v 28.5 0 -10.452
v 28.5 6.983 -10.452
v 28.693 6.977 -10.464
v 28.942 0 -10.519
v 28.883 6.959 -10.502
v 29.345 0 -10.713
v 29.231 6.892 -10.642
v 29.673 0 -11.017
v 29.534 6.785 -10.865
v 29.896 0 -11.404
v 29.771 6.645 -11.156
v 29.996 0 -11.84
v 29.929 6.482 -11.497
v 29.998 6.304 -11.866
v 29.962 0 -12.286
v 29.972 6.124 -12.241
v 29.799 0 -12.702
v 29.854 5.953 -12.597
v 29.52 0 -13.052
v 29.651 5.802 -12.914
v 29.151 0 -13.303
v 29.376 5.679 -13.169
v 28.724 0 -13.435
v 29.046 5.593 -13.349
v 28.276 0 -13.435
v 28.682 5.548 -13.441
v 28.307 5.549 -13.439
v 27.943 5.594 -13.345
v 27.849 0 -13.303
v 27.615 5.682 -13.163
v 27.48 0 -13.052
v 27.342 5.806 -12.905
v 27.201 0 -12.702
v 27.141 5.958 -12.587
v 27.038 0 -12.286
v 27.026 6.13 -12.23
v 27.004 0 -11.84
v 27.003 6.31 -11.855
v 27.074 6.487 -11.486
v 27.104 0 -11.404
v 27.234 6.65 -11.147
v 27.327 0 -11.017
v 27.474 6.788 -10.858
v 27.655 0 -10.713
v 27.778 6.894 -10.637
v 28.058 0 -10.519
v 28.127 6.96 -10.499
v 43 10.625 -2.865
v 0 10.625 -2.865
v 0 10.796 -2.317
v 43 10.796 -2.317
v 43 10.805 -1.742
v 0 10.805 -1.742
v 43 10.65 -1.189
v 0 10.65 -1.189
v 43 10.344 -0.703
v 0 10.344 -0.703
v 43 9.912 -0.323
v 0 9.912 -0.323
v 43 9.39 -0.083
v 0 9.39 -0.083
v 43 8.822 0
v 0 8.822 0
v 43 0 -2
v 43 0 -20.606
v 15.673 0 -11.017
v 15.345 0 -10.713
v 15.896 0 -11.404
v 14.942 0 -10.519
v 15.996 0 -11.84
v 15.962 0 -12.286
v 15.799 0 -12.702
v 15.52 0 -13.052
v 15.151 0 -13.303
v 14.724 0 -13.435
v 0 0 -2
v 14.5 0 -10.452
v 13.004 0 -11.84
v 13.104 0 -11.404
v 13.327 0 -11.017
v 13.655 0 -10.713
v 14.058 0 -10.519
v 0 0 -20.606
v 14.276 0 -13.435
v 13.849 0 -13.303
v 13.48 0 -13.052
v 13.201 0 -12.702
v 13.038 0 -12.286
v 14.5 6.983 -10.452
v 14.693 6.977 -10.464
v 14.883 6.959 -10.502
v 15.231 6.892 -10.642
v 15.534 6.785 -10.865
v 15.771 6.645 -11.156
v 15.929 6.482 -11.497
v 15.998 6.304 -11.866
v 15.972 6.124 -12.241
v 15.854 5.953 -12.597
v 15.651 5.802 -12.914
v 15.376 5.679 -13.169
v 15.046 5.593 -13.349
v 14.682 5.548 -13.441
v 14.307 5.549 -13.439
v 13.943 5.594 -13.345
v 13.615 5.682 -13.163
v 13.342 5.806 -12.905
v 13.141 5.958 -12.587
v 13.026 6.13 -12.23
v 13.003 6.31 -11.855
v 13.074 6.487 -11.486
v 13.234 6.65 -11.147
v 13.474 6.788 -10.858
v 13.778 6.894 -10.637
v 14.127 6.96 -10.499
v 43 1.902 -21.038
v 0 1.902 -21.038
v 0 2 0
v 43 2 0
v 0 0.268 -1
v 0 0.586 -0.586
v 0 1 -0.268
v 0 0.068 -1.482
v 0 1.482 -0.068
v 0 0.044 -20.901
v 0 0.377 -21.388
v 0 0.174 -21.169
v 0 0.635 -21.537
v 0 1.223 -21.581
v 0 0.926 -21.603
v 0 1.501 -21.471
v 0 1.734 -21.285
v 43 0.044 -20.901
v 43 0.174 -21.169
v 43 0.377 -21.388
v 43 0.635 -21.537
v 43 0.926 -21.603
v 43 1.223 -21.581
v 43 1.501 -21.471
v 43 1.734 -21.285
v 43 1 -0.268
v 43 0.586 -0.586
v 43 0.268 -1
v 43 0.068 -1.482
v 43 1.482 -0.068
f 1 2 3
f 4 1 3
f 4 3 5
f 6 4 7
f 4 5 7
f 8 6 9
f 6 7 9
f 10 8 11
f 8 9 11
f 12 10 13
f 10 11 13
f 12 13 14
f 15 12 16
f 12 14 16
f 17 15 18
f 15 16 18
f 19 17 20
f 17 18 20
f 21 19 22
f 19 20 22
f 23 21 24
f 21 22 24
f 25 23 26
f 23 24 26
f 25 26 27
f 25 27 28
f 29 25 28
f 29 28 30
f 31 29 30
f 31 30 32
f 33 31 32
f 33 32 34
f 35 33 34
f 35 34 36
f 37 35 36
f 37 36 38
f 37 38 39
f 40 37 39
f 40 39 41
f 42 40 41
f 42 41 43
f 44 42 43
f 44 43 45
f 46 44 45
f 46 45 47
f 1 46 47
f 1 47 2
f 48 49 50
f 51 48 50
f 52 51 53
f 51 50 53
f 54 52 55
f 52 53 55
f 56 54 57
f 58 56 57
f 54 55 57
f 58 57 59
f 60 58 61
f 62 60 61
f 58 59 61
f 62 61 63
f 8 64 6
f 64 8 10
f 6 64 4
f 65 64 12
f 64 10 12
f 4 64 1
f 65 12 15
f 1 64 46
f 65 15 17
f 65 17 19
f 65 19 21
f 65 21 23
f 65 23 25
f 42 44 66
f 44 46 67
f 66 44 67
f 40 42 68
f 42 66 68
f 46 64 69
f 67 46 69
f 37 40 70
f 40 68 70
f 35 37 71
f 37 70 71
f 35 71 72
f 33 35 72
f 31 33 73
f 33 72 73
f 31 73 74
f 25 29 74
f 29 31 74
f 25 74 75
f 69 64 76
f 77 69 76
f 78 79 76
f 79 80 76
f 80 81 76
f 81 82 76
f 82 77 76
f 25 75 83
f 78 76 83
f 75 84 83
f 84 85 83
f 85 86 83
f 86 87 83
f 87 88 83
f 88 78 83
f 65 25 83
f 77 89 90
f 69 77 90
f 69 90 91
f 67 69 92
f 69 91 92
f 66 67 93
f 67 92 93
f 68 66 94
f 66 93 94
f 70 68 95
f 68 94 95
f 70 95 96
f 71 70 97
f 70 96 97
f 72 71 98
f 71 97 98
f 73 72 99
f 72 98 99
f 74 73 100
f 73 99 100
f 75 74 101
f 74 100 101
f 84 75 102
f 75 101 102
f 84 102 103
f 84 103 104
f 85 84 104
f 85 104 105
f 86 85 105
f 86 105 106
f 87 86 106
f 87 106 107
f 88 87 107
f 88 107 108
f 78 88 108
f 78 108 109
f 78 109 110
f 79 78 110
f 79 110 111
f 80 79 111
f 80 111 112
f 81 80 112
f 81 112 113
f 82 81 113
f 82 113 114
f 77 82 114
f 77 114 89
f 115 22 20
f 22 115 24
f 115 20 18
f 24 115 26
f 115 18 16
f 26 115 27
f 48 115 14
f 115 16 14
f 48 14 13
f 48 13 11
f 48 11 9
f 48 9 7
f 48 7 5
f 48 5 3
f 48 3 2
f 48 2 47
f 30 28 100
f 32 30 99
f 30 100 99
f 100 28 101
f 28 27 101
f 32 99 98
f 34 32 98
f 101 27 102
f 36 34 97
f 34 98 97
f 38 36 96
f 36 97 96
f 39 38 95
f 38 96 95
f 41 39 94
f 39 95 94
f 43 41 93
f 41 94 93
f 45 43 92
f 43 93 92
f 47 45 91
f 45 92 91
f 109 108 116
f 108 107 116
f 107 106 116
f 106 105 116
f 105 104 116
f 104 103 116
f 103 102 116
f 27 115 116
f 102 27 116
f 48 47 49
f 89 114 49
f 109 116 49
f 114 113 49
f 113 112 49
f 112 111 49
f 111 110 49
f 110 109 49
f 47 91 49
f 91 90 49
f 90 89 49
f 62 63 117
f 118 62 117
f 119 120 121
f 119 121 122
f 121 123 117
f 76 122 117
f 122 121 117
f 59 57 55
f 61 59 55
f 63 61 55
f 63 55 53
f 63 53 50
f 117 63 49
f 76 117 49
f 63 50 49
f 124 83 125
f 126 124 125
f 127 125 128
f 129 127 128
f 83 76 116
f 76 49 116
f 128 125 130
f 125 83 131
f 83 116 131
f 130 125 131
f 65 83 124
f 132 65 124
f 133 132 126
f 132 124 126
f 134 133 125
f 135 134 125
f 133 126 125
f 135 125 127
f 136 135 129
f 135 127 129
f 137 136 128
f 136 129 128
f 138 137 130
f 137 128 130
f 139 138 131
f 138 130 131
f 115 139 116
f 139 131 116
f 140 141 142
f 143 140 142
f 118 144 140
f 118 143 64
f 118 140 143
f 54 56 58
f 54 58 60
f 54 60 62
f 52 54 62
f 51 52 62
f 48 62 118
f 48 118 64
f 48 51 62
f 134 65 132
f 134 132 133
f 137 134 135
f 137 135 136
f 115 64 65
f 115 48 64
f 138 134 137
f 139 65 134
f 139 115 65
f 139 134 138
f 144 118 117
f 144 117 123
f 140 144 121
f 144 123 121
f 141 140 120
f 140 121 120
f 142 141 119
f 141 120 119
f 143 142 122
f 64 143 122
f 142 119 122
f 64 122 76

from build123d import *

# Parameters (mm, degrees)
BOSS_EXTRUDE1_DEPTH = 43
SKETCH2_R           = 1.5
CUT_EXTRUDE1_DEPTH  = 50.150879706


with BuildPart() as part:
    # Sketch1 → Boss-Extrude1 (new body)
    with BuildSketch(Plane(origin=(0, 0, 0), x_dir=(0, 0, -1), z_dir=(1, 0, 0))):
        with BuildLine():
            Line((2, 0), (20.605762563, 0))
            ThreePointArc((20.605762563, 0), (21.580832575, 0.778102566), (21.03849363, 1.901523057))
            Line((21.03849363, 1.901523057), (2.865462135, 10.624578175))
            ThreePointArc((2.865462135, 10.624578175), (0.934853125, 10.514299657), (0, 8.82153206))
            Line((0, 8.82153206), (0, 2))
            ThreePointArc((0, 2), (0.585786438, 0.585786438), (2, 0))
        make_face()
    extrude(amount=BOSS_EXTRUDE1_DEPTH)

    # Sketch2 → Cut-Extrude1 (cut, through all)
    with BuildSketch(Plane(origin=(0, 10, 0), x_dir=(1, 0, 0), z_dir=(0, 1, 0))):
        with Locations(Location((14.5, 11.951977883, 0), (0, 0, 270))):
            Circle(SKETCH2_R)
        with Locations(Location((28.5, 11.951977883, 0), (0, 0, 270))):
            Circle(SKETCH2_R)
    extrude(amount=-CUT_EXTRUDE1_DEPTH, mode=Mode.SUBTRACT)


solid = part.part
